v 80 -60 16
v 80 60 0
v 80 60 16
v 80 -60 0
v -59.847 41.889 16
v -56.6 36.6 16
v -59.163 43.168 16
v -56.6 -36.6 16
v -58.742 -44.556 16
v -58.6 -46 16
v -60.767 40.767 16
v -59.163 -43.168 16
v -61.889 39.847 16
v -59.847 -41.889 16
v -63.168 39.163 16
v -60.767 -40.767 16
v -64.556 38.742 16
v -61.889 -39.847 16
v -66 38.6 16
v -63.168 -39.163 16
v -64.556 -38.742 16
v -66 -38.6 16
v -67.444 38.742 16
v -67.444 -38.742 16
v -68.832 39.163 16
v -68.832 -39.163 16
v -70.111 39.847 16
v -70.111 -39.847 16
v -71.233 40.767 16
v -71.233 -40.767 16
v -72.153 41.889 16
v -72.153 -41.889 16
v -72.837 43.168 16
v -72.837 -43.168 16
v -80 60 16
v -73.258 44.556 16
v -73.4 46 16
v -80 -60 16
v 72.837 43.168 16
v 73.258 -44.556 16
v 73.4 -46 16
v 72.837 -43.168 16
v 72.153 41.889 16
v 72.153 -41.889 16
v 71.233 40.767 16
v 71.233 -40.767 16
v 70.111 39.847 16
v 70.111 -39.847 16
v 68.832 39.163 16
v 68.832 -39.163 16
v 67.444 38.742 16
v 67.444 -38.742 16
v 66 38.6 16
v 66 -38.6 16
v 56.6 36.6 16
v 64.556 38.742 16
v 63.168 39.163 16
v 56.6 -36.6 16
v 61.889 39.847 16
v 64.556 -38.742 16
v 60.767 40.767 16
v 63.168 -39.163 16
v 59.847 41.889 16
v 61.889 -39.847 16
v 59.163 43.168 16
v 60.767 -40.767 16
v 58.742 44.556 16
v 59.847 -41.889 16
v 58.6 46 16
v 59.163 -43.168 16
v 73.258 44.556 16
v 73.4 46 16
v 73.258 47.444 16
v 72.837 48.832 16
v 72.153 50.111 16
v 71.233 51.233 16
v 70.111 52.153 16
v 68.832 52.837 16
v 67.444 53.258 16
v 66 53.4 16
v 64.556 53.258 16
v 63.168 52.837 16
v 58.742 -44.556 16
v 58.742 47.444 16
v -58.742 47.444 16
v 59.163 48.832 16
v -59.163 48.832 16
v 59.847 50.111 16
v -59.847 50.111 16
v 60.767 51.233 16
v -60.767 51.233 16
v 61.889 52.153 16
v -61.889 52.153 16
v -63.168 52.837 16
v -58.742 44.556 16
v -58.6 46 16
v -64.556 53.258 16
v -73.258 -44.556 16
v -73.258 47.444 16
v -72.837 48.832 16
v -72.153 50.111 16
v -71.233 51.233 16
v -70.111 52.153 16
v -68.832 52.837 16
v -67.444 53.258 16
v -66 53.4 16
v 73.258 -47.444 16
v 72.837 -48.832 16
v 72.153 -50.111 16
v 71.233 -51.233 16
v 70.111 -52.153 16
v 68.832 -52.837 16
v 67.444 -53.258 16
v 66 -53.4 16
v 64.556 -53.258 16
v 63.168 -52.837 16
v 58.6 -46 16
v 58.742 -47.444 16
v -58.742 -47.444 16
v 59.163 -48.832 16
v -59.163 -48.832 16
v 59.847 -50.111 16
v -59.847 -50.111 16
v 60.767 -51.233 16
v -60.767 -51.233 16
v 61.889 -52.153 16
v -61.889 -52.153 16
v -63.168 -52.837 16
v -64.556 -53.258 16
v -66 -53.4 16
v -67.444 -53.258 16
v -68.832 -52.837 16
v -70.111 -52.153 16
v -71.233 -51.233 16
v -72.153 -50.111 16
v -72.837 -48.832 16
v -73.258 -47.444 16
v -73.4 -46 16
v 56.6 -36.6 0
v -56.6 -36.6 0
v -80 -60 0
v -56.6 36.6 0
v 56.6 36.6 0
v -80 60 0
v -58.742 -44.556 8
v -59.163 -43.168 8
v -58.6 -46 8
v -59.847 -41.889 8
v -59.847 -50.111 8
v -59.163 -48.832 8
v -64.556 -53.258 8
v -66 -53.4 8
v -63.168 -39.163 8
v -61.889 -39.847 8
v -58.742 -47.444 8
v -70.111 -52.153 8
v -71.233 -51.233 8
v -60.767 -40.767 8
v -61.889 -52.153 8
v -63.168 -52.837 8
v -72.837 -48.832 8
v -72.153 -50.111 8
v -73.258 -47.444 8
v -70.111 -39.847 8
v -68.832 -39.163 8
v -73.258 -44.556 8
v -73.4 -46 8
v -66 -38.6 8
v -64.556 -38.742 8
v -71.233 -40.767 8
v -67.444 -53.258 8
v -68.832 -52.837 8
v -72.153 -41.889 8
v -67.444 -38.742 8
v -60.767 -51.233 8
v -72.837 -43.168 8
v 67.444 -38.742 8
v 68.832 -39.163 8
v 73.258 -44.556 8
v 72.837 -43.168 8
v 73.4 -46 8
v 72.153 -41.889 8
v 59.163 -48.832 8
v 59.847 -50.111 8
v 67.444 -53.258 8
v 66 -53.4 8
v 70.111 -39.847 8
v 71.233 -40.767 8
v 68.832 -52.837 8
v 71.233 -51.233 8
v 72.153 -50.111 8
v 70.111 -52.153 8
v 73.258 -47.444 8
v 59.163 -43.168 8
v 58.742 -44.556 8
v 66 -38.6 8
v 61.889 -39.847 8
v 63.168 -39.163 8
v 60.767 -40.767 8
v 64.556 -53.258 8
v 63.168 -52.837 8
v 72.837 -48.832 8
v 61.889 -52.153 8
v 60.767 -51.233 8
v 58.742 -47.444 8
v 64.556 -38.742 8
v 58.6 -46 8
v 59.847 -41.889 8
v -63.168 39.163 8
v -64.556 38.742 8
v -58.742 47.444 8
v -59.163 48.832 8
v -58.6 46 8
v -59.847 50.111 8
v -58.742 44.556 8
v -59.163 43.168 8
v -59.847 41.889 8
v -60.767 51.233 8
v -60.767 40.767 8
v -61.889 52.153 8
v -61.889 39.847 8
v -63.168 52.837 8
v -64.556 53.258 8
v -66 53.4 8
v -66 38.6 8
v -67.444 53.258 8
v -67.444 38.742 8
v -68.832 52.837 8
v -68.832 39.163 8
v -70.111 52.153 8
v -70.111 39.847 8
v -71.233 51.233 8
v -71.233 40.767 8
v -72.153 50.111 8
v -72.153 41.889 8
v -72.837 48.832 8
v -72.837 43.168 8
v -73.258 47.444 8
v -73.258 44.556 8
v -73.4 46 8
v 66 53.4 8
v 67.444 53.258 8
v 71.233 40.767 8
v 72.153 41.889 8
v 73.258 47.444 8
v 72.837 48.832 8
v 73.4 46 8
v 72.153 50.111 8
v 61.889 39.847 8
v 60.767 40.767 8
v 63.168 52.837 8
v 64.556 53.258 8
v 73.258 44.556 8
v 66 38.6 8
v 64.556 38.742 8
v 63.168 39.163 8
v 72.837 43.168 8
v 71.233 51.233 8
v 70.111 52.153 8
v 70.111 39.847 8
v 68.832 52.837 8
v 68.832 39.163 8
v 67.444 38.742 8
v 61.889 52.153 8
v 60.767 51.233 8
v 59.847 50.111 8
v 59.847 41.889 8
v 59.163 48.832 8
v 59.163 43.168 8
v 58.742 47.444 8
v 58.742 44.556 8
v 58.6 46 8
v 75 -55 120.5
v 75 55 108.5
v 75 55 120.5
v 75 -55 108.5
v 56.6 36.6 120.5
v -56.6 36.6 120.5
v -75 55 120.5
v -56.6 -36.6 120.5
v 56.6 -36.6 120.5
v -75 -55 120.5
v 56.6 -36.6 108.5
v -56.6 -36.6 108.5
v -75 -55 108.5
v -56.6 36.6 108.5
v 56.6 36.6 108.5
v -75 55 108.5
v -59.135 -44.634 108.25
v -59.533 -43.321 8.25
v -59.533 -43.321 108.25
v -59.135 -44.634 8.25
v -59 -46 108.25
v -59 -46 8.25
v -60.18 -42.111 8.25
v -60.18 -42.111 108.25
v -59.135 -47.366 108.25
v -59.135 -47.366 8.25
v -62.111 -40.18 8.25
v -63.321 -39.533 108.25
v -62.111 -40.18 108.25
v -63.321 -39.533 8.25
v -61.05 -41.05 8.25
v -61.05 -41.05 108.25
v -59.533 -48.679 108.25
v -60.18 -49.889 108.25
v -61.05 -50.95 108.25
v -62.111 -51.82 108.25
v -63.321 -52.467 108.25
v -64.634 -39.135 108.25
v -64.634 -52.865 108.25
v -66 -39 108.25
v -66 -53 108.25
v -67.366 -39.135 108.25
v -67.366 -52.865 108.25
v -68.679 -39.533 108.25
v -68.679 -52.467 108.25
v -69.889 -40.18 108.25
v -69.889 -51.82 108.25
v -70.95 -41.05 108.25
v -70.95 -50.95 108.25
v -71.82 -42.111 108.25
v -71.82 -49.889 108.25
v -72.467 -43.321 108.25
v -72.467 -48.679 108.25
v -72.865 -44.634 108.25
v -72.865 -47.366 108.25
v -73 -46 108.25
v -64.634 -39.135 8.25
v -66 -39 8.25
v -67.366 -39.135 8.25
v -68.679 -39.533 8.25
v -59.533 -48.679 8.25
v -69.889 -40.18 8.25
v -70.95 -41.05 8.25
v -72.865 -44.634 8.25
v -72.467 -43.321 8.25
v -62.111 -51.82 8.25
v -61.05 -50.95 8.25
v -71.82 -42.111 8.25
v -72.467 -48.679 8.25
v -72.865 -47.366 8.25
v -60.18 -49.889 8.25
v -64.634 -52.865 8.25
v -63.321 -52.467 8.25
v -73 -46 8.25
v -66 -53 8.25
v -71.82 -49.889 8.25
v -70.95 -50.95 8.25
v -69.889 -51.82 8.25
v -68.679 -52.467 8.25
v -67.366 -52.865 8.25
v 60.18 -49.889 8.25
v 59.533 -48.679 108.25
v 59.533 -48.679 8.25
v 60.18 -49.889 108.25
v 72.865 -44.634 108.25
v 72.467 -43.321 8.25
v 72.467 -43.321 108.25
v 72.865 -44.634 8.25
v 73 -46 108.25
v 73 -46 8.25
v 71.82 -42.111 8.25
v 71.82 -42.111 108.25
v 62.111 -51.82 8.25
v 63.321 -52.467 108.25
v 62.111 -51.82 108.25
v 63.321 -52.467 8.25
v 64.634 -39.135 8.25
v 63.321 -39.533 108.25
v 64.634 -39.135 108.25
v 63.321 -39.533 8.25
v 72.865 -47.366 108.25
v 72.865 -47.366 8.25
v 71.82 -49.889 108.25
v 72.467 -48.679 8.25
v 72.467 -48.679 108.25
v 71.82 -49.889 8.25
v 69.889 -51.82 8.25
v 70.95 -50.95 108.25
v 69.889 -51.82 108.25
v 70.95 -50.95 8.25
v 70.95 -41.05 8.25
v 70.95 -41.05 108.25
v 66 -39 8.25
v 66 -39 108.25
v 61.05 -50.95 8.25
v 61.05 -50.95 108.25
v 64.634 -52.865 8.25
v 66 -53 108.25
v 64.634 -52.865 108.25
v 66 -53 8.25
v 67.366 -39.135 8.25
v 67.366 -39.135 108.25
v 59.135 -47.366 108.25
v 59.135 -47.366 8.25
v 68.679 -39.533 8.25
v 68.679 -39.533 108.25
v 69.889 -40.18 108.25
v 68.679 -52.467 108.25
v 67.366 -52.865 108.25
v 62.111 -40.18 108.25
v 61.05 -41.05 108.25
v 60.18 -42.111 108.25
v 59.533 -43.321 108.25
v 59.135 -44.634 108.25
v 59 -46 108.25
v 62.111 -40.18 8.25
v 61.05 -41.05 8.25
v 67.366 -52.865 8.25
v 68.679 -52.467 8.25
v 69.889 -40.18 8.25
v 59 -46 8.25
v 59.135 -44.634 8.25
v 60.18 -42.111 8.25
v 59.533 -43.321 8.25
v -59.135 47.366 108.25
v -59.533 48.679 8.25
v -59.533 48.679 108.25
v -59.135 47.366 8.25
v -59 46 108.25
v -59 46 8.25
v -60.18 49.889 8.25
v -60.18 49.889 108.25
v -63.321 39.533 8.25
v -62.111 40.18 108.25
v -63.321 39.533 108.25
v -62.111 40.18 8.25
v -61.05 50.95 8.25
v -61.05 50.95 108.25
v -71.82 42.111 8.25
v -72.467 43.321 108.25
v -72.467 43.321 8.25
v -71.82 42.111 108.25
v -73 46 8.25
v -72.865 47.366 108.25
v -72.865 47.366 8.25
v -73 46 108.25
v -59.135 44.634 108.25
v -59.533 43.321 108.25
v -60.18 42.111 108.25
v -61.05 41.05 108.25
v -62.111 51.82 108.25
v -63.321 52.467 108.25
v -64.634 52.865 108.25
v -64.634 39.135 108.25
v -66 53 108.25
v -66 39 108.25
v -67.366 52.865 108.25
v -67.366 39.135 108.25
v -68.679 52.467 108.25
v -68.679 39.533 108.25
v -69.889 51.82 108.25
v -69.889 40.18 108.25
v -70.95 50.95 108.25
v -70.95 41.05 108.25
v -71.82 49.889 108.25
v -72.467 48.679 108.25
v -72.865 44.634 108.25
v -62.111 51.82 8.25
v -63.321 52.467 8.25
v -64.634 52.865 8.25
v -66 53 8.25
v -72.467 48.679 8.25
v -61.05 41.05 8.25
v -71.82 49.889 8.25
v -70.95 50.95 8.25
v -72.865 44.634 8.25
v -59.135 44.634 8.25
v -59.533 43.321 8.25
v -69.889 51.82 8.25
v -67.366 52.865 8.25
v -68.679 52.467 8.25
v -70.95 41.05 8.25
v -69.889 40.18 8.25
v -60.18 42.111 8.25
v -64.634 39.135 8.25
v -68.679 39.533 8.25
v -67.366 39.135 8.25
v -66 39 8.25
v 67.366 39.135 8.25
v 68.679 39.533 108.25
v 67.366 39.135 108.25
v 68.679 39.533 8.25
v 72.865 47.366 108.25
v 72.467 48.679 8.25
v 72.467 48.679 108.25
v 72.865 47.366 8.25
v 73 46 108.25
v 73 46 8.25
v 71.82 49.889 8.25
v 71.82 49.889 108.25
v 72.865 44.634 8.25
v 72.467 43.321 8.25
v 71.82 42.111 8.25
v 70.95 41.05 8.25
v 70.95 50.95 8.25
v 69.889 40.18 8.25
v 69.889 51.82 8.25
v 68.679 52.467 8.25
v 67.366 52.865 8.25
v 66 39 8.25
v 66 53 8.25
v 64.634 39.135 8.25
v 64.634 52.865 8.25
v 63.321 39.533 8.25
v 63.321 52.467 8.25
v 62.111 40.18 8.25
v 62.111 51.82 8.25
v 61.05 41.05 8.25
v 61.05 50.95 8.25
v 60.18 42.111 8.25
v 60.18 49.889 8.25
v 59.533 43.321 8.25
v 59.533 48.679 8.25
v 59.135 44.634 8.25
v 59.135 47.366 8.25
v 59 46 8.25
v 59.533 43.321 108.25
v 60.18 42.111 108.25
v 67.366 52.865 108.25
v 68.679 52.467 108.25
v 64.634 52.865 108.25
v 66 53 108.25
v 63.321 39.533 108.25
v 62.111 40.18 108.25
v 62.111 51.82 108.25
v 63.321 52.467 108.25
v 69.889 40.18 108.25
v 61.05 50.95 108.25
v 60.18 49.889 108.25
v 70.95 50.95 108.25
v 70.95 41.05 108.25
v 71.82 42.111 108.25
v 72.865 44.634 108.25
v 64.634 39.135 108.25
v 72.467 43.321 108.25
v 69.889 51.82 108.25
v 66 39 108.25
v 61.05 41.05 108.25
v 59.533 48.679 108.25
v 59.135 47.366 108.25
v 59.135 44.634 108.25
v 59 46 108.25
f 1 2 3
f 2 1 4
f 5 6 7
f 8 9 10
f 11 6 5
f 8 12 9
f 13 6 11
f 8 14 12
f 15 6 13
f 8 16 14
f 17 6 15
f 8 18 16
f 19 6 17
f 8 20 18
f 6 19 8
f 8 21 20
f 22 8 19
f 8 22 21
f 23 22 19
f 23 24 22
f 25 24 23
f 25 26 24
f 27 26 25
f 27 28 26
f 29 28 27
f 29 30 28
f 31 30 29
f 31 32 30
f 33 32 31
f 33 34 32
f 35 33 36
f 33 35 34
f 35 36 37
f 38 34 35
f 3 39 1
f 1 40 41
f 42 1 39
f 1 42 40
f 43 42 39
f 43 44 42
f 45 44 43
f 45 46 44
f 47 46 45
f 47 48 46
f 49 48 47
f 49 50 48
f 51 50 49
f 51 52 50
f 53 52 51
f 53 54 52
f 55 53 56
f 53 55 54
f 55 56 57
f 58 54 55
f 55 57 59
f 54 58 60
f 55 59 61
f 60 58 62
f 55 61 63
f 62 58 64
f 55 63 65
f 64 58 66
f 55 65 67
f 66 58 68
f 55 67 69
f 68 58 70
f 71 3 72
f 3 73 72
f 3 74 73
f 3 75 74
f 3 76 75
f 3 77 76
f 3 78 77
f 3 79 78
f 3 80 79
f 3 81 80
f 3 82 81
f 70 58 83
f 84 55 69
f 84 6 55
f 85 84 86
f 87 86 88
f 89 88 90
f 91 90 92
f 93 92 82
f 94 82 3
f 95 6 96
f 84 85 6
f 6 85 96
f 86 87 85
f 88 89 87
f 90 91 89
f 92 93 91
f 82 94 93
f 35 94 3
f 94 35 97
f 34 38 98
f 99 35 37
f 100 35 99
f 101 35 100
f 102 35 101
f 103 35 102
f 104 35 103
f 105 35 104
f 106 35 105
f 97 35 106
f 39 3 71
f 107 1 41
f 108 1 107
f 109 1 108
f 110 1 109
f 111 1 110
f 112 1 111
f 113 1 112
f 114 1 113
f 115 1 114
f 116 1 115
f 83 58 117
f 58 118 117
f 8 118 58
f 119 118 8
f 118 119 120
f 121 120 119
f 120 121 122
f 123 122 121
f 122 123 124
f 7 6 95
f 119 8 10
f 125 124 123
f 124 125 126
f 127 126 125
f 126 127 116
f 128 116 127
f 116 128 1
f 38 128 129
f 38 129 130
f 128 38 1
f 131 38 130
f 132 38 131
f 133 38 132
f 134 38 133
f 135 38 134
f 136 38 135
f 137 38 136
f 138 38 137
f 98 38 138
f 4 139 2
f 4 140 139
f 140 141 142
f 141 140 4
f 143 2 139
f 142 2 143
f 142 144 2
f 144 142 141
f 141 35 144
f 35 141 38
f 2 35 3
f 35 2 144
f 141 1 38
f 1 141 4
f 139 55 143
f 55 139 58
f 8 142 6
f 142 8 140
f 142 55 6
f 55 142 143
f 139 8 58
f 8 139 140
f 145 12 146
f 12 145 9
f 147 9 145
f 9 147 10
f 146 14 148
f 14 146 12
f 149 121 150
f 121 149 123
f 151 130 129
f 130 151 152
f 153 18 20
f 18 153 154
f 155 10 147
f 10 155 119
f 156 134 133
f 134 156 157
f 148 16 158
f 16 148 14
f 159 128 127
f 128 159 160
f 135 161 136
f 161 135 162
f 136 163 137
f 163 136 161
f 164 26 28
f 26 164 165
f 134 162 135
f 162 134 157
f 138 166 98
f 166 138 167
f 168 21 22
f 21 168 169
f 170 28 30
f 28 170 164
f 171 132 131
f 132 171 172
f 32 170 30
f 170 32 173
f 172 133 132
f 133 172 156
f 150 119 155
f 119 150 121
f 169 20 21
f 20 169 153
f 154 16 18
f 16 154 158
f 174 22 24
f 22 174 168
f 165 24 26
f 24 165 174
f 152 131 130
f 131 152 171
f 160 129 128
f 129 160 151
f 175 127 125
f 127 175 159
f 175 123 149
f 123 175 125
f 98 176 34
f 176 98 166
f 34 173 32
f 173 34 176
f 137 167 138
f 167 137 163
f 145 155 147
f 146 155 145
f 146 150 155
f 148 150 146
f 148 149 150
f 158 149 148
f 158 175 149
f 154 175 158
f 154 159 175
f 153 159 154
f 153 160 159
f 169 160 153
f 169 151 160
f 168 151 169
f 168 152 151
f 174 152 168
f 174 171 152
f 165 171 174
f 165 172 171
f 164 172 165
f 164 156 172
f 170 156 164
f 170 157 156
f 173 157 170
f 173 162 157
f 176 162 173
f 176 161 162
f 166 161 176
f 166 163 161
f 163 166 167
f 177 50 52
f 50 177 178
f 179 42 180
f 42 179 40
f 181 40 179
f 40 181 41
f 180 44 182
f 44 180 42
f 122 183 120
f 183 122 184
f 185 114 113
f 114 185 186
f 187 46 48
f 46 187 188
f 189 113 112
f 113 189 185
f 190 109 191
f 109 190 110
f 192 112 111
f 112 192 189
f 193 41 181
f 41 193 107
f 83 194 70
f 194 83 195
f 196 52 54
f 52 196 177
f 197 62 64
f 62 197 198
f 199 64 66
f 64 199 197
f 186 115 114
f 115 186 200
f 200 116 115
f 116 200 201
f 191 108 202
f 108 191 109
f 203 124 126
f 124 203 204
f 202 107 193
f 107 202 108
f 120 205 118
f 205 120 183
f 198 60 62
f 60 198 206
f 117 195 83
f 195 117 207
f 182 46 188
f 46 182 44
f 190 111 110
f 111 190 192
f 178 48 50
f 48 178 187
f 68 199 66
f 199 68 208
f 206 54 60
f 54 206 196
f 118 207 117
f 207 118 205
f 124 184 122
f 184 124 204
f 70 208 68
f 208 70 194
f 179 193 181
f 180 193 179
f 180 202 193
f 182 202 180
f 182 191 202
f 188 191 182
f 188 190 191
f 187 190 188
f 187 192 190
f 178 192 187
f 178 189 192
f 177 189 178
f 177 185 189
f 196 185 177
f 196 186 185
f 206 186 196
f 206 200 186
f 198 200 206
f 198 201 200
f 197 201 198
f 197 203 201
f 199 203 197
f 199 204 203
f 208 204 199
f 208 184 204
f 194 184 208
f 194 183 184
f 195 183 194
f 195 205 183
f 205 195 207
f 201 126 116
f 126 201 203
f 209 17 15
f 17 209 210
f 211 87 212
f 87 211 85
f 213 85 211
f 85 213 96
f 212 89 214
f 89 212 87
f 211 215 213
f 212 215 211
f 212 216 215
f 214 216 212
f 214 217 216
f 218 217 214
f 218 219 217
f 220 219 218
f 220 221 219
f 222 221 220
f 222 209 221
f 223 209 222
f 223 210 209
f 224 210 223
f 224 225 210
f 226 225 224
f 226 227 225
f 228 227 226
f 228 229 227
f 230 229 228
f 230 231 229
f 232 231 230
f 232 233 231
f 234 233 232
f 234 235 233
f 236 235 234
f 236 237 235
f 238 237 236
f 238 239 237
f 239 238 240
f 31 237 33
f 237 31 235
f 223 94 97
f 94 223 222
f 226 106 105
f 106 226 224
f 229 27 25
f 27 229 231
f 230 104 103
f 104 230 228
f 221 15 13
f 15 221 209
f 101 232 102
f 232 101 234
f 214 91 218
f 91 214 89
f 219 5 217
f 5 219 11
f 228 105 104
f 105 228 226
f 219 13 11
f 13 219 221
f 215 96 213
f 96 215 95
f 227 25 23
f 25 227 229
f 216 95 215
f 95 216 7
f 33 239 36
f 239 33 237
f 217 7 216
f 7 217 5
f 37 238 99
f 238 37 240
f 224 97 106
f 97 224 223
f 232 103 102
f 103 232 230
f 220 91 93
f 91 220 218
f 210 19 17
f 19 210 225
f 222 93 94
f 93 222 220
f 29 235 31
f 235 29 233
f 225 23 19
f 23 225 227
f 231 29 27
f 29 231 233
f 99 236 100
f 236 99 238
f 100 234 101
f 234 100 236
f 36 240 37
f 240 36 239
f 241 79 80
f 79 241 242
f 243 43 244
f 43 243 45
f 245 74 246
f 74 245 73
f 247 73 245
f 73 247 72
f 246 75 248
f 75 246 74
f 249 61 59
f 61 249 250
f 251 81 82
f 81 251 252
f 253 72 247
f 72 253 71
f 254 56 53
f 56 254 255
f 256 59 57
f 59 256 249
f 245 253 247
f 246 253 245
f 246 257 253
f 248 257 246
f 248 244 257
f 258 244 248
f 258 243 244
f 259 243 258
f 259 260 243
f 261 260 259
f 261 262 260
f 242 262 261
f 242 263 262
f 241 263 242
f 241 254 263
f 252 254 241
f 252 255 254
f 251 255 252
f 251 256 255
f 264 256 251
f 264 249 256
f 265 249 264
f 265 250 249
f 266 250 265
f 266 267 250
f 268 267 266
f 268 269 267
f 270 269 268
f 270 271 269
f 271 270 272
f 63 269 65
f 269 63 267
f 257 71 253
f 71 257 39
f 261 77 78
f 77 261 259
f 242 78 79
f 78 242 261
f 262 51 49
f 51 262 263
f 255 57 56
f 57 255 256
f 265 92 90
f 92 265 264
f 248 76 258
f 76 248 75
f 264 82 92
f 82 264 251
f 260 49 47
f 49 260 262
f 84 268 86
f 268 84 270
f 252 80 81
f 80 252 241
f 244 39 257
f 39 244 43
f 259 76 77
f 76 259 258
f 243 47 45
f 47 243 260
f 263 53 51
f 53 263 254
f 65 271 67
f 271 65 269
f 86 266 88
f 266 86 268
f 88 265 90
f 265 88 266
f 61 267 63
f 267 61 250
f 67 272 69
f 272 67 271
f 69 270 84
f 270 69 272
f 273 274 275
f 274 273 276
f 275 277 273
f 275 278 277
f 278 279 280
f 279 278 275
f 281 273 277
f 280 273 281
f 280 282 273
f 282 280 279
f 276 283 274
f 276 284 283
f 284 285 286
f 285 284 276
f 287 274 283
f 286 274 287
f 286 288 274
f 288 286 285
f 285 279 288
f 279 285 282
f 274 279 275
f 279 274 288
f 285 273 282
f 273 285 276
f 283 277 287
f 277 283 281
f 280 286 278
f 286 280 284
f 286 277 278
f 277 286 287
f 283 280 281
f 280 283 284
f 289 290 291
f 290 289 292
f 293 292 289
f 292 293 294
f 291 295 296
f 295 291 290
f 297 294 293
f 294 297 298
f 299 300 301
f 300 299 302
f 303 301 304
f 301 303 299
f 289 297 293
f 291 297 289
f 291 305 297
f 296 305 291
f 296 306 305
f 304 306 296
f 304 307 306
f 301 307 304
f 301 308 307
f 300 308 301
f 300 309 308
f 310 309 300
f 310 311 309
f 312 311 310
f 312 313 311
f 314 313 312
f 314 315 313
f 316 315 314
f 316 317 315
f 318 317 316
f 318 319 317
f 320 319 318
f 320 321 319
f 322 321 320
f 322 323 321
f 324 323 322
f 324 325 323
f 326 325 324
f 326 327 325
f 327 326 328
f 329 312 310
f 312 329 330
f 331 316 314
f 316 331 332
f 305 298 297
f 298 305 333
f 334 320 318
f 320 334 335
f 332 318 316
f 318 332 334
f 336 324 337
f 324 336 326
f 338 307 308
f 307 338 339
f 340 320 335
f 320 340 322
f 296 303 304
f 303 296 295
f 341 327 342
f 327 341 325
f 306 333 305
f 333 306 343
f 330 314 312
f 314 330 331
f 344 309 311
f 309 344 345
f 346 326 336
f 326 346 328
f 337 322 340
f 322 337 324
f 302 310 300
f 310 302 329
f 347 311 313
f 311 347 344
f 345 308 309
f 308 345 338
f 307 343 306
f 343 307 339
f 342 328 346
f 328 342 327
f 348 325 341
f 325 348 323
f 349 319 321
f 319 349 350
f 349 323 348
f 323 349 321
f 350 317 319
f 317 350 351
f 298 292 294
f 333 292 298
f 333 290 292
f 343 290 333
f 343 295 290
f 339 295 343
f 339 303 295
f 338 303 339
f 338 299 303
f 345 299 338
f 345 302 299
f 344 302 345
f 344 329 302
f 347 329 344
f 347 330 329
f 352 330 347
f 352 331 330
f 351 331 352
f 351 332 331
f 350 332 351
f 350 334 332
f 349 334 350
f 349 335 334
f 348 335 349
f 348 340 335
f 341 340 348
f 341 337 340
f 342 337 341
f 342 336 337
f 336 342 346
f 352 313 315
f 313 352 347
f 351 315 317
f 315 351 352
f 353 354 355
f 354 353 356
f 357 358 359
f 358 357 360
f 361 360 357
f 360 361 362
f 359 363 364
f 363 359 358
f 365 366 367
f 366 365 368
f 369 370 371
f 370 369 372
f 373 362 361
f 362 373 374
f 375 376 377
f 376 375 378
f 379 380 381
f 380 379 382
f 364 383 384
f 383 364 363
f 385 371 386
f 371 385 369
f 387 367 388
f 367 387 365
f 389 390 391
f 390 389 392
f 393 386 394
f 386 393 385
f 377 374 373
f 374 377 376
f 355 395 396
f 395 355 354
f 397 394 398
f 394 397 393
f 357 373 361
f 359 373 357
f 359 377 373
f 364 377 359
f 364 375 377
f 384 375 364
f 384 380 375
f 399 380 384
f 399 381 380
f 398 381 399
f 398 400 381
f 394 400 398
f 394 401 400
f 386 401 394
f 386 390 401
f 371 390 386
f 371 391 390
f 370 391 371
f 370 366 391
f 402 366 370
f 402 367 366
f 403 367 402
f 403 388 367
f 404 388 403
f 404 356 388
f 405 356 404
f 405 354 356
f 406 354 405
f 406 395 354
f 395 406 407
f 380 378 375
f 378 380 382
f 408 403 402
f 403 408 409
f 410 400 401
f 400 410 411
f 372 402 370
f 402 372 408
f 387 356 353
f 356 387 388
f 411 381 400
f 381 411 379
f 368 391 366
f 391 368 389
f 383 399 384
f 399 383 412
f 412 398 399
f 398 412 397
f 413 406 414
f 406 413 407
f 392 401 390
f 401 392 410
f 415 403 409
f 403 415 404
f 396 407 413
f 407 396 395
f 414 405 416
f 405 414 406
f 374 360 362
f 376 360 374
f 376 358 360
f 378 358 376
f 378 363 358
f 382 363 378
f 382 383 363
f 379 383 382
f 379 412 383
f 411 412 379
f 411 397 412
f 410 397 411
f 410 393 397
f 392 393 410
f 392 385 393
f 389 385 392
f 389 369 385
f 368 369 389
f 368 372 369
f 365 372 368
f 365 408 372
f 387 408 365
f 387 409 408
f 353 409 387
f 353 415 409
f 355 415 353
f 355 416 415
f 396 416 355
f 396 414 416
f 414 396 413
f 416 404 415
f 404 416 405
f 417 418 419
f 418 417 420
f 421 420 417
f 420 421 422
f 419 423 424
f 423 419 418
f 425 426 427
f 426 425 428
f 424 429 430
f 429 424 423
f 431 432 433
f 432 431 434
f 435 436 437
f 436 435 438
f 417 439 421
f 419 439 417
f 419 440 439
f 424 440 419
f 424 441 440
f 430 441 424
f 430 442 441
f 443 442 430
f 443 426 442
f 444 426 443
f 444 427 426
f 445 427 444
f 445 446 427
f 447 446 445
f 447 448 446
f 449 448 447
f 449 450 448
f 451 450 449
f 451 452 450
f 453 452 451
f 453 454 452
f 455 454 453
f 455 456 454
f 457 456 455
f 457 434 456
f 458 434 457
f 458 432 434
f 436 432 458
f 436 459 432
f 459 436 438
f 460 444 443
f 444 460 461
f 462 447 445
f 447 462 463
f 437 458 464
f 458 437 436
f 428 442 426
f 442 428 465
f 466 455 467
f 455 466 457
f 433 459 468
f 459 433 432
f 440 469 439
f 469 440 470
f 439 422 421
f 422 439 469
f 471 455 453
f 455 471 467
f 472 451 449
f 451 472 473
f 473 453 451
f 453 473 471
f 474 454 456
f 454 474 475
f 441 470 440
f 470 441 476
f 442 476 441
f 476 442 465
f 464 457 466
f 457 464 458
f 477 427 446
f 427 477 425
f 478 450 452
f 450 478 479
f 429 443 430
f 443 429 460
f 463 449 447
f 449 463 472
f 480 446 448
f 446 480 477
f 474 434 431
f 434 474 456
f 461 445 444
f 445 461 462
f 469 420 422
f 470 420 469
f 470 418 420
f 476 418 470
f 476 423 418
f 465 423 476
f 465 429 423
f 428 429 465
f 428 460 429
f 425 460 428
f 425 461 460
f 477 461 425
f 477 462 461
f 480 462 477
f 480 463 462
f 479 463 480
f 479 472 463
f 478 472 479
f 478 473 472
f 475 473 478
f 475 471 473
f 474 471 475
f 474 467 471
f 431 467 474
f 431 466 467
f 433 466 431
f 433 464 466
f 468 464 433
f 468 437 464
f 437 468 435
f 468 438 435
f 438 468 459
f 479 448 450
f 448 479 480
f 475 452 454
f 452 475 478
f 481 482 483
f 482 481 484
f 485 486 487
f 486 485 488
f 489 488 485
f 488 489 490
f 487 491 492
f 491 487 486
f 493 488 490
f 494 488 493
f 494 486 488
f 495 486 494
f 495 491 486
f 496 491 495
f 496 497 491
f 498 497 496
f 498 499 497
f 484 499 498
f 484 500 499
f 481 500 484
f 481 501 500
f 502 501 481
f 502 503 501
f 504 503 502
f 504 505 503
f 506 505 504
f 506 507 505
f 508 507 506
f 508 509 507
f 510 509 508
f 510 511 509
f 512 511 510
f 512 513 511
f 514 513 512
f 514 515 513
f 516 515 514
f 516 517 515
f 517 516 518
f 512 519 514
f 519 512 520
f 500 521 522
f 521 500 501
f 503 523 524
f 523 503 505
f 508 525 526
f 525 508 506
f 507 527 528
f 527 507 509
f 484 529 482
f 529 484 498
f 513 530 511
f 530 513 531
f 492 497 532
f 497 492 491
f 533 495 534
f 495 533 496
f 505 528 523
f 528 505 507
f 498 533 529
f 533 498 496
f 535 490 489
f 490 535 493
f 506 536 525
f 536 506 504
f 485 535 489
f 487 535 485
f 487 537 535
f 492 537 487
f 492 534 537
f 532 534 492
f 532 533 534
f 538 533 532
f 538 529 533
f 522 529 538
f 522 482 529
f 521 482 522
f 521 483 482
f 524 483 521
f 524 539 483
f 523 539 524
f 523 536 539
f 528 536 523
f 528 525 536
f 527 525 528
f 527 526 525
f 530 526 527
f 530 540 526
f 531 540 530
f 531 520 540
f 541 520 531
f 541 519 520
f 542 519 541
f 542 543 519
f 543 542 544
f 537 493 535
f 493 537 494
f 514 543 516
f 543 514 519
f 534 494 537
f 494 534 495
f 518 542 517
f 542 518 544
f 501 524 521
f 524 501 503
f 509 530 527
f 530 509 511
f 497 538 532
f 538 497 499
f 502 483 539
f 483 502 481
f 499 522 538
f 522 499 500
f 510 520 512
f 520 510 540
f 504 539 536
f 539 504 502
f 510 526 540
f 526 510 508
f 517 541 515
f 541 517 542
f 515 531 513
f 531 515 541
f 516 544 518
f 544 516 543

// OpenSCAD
$fn = 32;

// ------------------------------------------------------------------------
// Frame cube: base 160 x 120 mm, posts 100 mm tall
// Every part is its own module, assembly() places every instance.
// ------------------------------------------------------------------------

// --- part 1 ---
module base_frame() {
  difference() {
    translate([-80, -60, 0]) cube([160, 120, 16]);
    translate([-56.6, -36.6, -1]) cube([113.2, 73.2, 18]);
    translate([-66, -46, 8]) cylinder(h = 9, d = 14.8);
    translate([66, -46, 8]) cylinder(h = 9, d = 14.8);
    translate([-66, 46, 8]) cylinder(h = 9, d = 14.8);
    translate([66, 46, 8]) cylinder(h = 9, d = 14.8);
  }
}

// --- part 2 ---
module corner_post() {
  cylinder(h = 100, d = 14);
}

// --- part 3 ---
module top_frame() {
  difference() {
    translate([-75, -55, 0]) cube([150, 110, 12]);
    translate([-56.6, -36.6, -1]) cube([113.2, 73.2, 14]);
  }
}

// --- assembly ---
module assembly() {
  color([0.80, 0.24, 0.20]) translate([0, 0, 0]) rotate([0, 0, 0]) base_frame();
  color([0.20, 0.45, 0.75]) translate([-66, -46, 8.25]) rotate([0, 0, 0]) corner_post();
  color([0.25, 0.62, 0.32]) translate([66, -46, 8.25]) rotate([0, 0, 0]) corner_post();
  color([0.92, 0.70, 0.18]) translate([-66, 46, 8.25]) rotate([0, 0, 0]) corner_post();
  color([0.58, 0.35, 0.70]) translate([66, 46, 8.25]) rotate([0, 0, 0]) corner_post();
  color([0.16, 0.66, 0.66]) translate([0, 0, 108.5]) rotate([0, 0, 0]) top_frame();
}

assembly();
